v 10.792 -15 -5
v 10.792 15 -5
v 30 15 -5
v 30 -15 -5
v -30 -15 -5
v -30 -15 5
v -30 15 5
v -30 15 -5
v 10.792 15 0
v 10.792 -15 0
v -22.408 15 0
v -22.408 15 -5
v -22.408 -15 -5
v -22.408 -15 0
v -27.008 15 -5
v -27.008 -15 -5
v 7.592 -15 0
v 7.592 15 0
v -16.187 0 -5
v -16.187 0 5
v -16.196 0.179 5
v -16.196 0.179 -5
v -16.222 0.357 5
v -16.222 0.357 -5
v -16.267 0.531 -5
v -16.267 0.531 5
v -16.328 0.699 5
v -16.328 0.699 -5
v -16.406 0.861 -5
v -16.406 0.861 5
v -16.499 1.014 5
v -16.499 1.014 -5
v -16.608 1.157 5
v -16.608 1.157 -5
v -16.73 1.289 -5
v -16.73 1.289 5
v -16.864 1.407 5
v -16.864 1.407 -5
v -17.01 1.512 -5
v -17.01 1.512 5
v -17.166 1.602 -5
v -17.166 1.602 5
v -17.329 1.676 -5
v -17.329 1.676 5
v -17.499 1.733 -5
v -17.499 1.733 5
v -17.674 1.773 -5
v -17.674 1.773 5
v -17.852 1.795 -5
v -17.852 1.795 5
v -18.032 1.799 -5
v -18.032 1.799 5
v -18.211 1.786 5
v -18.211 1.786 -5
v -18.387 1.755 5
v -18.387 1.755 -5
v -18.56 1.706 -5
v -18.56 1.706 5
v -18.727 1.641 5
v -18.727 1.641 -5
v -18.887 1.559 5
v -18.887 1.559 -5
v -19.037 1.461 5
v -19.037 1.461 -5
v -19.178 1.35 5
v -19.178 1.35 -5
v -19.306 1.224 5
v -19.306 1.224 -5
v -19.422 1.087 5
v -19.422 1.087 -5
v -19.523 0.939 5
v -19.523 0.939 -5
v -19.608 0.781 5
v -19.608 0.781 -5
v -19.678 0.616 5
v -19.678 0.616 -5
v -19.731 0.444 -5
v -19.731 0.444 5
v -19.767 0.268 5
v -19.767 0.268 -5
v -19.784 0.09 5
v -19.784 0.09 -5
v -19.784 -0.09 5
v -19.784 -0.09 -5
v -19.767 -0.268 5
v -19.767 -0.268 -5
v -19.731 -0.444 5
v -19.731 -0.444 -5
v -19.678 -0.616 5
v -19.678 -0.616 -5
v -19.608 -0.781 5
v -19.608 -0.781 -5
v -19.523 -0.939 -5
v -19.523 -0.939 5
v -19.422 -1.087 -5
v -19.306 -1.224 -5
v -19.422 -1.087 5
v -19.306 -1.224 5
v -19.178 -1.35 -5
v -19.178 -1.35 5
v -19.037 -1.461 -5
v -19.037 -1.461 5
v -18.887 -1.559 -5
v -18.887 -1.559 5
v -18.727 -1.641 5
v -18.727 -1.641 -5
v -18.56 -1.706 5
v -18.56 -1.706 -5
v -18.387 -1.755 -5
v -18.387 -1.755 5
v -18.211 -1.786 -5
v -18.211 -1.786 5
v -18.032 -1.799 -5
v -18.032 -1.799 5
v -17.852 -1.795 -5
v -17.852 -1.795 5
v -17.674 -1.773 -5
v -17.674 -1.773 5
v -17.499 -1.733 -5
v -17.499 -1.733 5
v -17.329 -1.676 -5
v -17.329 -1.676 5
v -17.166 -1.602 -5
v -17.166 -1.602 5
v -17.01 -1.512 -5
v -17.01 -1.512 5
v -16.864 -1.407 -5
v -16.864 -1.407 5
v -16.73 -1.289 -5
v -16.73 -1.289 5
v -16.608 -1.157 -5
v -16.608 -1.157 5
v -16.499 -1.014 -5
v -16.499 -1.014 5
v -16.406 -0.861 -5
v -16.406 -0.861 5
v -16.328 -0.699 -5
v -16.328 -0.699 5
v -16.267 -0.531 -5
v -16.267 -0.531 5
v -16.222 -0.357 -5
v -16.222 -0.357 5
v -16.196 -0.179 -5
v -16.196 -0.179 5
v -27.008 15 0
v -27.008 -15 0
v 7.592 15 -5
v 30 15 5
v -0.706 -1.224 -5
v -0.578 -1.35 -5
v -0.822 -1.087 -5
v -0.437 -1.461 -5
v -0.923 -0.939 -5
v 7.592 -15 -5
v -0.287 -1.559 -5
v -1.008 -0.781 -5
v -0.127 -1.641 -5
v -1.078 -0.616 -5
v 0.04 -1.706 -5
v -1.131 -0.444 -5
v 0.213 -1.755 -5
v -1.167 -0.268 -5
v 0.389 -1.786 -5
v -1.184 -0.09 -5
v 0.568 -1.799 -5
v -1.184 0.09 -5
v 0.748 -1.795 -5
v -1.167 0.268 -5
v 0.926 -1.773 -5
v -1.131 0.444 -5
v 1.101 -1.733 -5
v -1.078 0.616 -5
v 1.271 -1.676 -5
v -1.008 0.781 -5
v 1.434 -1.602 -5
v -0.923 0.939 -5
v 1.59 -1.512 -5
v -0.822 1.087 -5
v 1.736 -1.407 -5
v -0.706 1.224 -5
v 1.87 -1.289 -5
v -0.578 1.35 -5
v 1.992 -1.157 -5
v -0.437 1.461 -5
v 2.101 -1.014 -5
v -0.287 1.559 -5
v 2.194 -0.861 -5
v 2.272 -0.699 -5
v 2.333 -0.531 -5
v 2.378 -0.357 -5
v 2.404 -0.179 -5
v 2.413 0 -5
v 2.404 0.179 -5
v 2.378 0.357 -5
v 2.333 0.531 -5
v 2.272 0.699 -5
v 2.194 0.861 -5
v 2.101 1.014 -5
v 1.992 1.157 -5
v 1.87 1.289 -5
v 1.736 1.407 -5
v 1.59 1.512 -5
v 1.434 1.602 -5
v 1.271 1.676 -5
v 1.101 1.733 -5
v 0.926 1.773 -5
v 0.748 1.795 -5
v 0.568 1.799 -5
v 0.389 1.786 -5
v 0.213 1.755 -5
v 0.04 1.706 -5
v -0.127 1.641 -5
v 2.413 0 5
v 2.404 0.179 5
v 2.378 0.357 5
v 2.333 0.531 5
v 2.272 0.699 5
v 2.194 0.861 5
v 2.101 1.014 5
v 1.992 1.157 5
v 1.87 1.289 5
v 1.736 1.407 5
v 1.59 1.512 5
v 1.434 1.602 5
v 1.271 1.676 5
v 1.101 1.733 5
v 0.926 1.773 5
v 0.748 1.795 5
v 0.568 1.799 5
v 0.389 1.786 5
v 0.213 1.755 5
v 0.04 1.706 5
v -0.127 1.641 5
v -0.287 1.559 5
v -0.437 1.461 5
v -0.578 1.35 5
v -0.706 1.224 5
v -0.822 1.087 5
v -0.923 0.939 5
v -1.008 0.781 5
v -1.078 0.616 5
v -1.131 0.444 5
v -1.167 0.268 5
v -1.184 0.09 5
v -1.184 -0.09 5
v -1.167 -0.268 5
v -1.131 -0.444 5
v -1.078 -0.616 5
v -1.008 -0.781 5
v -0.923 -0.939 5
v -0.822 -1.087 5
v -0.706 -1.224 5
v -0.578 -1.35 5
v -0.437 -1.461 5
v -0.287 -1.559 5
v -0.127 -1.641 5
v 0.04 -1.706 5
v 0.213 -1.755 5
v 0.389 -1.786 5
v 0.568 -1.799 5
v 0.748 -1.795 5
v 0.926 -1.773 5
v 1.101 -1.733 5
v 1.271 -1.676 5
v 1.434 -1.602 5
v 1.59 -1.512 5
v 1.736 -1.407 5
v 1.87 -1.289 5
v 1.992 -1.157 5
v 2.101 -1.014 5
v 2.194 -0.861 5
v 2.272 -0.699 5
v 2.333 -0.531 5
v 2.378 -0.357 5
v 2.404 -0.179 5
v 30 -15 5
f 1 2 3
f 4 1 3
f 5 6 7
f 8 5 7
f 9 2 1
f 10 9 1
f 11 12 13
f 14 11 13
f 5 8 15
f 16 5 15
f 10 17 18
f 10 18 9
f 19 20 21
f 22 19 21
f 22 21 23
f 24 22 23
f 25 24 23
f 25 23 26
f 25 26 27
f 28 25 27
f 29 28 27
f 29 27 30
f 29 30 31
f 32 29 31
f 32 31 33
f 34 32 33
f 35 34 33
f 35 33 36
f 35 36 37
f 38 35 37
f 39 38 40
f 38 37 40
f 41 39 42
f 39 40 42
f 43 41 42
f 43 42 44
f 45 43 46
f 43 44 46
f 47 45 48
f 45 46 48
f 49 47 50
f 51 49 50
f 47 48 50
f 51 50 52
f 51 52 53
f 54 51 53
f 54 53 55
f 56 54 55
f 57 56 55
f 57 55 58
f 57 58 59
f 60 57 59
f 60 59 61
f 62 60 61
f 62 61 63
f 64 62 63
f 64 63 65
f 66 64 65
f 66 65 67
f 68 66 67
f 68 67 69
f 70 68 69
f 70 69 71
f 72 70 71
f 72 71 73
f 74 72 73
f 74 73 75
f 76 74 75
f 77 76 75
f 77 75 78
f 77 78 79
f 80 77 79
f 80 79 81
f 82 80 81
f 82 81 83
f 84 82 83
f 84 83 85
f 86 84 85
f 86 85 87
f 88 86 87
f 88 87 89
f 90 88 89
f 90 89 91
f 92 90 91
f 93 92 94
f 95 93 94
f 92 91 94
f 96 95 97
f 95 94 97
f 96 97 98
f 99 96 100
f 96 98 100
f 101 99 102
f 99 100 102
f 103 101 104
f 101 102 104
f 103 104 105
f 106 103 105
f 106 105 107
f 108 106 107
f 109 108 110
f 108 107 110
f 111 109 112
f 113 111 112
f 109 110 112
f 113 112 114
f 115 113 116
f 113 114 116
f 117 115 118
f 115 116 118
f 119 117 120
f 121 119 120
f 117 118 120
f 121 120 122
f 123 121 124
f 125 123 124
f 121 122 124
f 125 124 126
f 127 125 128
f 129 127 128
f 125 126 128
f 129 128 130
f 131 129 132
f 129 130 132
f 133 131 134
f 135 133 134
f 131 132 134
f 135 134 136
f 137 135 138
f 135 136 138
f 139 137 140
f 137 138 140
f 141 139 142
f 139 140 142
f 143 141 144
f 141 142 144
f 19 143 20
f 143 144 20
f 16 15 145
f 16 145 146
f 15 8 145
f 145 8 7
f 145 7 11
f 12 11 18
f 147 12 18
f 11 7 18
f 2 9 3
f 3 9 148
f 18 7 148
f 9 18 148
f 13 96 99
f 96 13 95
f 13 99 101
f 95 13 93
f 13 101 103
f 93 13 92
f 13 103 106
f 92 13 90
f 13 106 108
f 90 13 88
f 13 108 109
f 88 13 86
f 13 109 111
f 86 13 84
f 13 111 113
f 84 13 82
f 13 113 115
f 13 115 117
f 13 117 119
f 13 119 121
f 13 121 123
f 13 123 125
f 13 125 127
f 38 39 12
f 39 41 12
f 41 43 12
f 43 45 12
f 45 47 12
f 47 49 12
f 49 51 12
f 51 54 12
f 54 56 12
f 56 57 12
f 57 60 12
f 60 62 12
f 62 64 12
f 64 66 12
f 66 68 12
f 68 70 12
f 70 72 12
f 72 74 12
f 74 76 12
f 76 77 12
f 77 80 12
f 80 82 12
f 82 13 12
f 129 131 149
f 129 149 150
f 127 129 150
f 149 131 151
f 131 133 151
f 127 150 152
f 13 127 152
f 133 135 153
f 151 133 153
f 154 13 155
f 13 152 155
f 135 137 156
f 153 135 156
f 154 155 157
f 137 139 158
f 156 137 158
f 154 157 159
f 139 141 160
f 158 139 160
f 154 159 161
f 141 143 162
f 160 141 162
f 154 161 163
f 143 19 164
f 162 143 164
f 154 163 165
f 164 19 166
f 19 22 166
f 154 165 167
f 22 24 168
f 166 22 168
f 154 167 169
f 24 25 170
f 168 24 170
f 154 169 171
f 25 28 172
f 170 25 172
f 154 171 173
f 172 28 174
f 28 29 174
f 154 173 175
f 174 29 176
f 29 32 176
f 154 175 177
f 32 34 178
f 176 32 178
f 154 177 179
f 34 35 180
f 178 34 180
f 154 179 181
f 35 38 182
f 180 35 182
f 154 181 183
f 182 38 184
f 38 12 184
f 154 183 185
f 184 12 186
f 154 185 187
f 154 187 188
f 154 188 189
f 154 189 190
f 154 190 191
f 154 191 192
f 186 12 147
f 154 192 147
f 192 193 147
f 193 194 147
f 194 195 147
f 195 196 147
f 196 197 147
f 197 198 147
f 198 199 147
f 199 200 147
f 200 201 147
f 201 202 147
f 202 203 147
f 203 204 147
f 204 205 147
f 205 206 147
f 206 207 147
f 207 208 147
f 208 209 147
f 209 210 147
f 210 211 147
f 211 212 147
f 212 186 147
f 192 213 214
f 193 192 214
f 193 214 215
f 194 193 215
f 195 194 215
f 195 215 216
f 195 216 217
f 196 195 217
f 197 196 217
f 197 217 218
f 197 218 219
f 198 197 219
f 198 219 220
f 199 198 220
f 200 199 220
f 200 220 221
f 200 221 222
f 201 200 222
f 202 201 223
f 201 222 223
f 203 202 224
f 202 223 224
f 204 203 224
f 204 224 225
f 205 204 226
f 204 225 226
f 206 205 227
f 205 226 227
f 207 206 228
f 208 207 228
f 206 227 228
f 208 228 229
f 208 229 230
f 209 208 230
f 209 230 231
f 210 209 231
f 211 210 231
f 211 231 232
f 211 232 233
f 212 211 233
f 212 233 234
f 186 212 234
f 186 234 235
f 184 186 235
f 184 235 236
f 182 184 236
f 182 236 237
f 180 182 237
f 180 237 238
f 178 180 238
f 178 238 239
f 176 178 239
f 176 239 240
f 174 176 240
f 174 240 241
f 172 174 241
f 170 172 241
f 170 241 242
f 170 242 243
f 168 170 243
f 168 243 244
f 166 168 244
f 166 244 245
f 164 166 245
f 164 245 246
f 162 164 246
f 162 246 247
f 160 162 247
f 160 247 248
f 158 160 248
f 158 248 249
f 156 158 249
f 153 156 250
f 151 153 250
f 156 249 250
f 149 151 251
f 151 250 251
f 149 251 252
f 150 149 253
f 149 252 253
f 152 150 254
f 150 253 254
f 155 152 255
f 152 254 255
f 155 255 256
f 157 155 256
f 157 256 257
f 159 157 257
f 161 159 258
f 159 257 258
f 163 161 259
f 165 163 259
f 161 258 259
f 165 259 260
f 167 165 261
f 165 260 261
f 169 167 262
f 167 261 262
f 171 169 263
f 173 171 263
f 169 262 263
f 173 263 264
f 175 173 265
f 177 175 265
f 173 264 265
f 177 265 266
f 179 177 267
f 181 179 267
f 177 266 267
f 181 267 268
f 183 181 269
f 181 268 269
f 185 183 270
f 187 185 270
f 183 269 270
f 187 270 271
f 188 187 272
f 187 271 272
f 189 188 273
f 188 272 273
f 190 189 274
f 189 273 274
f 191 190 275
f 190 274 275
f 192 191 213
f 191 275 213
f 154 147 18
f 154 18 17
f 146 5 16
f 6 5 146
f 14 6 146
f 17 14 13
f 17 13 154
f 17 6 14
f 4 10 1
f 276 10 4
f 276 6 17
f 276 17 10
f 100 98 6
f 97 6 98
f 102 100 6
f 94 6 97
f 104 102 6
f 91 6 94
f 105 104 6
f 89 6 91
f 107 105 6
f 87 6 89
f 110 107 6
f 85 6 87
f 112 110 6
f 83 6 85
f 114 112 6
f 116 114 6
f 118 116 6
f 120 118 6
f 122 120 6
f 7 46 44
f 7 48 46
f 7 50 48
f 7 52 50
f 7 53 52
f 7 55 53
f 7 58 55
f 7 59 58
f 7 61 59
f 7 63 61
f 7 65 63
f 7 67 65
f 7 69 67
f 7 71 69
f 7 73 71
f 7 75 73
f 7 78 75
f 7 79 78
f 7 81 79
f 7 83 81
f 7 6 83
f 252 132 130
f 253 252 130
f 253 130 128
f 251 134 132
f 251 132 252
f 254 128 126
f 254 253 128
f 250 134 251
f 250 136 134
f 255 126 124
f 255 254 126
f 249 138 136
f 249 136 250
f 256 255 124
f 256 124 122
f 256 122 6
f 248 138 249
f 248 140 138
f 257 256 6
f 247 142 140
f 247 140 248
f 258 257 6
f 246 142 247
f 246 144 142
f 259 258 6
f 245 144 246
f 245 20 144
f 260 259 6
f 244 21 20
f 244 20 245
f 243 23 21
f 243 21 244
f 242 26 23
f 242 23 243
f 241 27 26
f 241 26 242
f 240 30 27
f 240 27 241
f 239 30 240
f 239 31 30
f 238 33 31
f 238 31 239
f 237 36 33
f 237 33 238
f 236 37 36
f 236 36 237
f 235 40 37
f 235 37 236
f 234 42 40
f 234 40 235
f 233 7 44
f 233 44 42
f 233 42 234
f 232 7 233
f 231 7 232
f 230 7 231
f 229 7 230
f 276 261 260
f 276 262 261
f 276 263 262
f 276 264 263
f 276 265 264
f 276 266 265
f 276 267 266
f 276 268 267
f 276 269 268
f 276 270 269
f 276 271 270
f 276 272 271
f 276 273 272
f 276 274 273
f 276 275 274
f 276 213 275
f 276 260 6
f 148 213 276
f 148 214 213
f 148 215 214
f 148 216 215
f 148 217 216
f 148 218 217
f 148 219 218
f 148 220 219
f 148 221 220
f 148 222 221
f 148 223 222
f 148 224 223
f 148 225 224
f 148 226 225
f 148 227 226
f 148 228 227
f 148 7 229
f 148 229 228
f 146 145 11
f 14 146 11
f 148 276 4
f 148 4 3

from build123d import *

# Parameters (mm, degrees)
F0_W     = 60
F0_H     = 30
F1_DEPTH = 5
F2_W     = 3.2
F2_H     = 30
F2_W_2   = 4.6
F3_DEPTH = 5
F4_R     = 1.8
F5_DEPTH = 26
F6_R     = 1.8
F7_DEPTH = 26


with BuildPart() as f1:
    # F0 (on Top) → F1 (new body, symmetric)
    with BuildSketch(Plane.XY):
        Rectangle(F0_W, F0_H)
    extrude(amount=F1_DEPTH, both=True)

    # F2 (on face) → F3 (cut)
    with BuildSketch(Plane(origin=(0, 0, -5), x_dir=(1, 0, 0), z_dir=(0, 0, -1))):
        with Locations((9.191833, 0)):
            Rectangle(F2_W, F2_H)
        with Locations((-24.708167, 0)):
            Rectangle(F2_W_2, F2_H)
    extrude(amount=-F3_DEPTH, mode=Mode.SUBTRACT)

    # F4 (on face) → F5 (cut)
    with BuildSketch(Plane.XY.offset(5)):
        with Locations((-17.986729, 0)):
            Circle(F4_R)
    extrude(amount=-F5_DEPTH, mode=Mode.SUBTRACT)

    # F6 (on face) → F7 (cut)
    with BuildSketch(Plane.XY.offset(5)):
        with Locations((0.613271, 0)):
            Circle(F6_R)
    extrude(amount=-F7_DEPTH, mode=Mode.SUBTRACT)


solid = f1.part
